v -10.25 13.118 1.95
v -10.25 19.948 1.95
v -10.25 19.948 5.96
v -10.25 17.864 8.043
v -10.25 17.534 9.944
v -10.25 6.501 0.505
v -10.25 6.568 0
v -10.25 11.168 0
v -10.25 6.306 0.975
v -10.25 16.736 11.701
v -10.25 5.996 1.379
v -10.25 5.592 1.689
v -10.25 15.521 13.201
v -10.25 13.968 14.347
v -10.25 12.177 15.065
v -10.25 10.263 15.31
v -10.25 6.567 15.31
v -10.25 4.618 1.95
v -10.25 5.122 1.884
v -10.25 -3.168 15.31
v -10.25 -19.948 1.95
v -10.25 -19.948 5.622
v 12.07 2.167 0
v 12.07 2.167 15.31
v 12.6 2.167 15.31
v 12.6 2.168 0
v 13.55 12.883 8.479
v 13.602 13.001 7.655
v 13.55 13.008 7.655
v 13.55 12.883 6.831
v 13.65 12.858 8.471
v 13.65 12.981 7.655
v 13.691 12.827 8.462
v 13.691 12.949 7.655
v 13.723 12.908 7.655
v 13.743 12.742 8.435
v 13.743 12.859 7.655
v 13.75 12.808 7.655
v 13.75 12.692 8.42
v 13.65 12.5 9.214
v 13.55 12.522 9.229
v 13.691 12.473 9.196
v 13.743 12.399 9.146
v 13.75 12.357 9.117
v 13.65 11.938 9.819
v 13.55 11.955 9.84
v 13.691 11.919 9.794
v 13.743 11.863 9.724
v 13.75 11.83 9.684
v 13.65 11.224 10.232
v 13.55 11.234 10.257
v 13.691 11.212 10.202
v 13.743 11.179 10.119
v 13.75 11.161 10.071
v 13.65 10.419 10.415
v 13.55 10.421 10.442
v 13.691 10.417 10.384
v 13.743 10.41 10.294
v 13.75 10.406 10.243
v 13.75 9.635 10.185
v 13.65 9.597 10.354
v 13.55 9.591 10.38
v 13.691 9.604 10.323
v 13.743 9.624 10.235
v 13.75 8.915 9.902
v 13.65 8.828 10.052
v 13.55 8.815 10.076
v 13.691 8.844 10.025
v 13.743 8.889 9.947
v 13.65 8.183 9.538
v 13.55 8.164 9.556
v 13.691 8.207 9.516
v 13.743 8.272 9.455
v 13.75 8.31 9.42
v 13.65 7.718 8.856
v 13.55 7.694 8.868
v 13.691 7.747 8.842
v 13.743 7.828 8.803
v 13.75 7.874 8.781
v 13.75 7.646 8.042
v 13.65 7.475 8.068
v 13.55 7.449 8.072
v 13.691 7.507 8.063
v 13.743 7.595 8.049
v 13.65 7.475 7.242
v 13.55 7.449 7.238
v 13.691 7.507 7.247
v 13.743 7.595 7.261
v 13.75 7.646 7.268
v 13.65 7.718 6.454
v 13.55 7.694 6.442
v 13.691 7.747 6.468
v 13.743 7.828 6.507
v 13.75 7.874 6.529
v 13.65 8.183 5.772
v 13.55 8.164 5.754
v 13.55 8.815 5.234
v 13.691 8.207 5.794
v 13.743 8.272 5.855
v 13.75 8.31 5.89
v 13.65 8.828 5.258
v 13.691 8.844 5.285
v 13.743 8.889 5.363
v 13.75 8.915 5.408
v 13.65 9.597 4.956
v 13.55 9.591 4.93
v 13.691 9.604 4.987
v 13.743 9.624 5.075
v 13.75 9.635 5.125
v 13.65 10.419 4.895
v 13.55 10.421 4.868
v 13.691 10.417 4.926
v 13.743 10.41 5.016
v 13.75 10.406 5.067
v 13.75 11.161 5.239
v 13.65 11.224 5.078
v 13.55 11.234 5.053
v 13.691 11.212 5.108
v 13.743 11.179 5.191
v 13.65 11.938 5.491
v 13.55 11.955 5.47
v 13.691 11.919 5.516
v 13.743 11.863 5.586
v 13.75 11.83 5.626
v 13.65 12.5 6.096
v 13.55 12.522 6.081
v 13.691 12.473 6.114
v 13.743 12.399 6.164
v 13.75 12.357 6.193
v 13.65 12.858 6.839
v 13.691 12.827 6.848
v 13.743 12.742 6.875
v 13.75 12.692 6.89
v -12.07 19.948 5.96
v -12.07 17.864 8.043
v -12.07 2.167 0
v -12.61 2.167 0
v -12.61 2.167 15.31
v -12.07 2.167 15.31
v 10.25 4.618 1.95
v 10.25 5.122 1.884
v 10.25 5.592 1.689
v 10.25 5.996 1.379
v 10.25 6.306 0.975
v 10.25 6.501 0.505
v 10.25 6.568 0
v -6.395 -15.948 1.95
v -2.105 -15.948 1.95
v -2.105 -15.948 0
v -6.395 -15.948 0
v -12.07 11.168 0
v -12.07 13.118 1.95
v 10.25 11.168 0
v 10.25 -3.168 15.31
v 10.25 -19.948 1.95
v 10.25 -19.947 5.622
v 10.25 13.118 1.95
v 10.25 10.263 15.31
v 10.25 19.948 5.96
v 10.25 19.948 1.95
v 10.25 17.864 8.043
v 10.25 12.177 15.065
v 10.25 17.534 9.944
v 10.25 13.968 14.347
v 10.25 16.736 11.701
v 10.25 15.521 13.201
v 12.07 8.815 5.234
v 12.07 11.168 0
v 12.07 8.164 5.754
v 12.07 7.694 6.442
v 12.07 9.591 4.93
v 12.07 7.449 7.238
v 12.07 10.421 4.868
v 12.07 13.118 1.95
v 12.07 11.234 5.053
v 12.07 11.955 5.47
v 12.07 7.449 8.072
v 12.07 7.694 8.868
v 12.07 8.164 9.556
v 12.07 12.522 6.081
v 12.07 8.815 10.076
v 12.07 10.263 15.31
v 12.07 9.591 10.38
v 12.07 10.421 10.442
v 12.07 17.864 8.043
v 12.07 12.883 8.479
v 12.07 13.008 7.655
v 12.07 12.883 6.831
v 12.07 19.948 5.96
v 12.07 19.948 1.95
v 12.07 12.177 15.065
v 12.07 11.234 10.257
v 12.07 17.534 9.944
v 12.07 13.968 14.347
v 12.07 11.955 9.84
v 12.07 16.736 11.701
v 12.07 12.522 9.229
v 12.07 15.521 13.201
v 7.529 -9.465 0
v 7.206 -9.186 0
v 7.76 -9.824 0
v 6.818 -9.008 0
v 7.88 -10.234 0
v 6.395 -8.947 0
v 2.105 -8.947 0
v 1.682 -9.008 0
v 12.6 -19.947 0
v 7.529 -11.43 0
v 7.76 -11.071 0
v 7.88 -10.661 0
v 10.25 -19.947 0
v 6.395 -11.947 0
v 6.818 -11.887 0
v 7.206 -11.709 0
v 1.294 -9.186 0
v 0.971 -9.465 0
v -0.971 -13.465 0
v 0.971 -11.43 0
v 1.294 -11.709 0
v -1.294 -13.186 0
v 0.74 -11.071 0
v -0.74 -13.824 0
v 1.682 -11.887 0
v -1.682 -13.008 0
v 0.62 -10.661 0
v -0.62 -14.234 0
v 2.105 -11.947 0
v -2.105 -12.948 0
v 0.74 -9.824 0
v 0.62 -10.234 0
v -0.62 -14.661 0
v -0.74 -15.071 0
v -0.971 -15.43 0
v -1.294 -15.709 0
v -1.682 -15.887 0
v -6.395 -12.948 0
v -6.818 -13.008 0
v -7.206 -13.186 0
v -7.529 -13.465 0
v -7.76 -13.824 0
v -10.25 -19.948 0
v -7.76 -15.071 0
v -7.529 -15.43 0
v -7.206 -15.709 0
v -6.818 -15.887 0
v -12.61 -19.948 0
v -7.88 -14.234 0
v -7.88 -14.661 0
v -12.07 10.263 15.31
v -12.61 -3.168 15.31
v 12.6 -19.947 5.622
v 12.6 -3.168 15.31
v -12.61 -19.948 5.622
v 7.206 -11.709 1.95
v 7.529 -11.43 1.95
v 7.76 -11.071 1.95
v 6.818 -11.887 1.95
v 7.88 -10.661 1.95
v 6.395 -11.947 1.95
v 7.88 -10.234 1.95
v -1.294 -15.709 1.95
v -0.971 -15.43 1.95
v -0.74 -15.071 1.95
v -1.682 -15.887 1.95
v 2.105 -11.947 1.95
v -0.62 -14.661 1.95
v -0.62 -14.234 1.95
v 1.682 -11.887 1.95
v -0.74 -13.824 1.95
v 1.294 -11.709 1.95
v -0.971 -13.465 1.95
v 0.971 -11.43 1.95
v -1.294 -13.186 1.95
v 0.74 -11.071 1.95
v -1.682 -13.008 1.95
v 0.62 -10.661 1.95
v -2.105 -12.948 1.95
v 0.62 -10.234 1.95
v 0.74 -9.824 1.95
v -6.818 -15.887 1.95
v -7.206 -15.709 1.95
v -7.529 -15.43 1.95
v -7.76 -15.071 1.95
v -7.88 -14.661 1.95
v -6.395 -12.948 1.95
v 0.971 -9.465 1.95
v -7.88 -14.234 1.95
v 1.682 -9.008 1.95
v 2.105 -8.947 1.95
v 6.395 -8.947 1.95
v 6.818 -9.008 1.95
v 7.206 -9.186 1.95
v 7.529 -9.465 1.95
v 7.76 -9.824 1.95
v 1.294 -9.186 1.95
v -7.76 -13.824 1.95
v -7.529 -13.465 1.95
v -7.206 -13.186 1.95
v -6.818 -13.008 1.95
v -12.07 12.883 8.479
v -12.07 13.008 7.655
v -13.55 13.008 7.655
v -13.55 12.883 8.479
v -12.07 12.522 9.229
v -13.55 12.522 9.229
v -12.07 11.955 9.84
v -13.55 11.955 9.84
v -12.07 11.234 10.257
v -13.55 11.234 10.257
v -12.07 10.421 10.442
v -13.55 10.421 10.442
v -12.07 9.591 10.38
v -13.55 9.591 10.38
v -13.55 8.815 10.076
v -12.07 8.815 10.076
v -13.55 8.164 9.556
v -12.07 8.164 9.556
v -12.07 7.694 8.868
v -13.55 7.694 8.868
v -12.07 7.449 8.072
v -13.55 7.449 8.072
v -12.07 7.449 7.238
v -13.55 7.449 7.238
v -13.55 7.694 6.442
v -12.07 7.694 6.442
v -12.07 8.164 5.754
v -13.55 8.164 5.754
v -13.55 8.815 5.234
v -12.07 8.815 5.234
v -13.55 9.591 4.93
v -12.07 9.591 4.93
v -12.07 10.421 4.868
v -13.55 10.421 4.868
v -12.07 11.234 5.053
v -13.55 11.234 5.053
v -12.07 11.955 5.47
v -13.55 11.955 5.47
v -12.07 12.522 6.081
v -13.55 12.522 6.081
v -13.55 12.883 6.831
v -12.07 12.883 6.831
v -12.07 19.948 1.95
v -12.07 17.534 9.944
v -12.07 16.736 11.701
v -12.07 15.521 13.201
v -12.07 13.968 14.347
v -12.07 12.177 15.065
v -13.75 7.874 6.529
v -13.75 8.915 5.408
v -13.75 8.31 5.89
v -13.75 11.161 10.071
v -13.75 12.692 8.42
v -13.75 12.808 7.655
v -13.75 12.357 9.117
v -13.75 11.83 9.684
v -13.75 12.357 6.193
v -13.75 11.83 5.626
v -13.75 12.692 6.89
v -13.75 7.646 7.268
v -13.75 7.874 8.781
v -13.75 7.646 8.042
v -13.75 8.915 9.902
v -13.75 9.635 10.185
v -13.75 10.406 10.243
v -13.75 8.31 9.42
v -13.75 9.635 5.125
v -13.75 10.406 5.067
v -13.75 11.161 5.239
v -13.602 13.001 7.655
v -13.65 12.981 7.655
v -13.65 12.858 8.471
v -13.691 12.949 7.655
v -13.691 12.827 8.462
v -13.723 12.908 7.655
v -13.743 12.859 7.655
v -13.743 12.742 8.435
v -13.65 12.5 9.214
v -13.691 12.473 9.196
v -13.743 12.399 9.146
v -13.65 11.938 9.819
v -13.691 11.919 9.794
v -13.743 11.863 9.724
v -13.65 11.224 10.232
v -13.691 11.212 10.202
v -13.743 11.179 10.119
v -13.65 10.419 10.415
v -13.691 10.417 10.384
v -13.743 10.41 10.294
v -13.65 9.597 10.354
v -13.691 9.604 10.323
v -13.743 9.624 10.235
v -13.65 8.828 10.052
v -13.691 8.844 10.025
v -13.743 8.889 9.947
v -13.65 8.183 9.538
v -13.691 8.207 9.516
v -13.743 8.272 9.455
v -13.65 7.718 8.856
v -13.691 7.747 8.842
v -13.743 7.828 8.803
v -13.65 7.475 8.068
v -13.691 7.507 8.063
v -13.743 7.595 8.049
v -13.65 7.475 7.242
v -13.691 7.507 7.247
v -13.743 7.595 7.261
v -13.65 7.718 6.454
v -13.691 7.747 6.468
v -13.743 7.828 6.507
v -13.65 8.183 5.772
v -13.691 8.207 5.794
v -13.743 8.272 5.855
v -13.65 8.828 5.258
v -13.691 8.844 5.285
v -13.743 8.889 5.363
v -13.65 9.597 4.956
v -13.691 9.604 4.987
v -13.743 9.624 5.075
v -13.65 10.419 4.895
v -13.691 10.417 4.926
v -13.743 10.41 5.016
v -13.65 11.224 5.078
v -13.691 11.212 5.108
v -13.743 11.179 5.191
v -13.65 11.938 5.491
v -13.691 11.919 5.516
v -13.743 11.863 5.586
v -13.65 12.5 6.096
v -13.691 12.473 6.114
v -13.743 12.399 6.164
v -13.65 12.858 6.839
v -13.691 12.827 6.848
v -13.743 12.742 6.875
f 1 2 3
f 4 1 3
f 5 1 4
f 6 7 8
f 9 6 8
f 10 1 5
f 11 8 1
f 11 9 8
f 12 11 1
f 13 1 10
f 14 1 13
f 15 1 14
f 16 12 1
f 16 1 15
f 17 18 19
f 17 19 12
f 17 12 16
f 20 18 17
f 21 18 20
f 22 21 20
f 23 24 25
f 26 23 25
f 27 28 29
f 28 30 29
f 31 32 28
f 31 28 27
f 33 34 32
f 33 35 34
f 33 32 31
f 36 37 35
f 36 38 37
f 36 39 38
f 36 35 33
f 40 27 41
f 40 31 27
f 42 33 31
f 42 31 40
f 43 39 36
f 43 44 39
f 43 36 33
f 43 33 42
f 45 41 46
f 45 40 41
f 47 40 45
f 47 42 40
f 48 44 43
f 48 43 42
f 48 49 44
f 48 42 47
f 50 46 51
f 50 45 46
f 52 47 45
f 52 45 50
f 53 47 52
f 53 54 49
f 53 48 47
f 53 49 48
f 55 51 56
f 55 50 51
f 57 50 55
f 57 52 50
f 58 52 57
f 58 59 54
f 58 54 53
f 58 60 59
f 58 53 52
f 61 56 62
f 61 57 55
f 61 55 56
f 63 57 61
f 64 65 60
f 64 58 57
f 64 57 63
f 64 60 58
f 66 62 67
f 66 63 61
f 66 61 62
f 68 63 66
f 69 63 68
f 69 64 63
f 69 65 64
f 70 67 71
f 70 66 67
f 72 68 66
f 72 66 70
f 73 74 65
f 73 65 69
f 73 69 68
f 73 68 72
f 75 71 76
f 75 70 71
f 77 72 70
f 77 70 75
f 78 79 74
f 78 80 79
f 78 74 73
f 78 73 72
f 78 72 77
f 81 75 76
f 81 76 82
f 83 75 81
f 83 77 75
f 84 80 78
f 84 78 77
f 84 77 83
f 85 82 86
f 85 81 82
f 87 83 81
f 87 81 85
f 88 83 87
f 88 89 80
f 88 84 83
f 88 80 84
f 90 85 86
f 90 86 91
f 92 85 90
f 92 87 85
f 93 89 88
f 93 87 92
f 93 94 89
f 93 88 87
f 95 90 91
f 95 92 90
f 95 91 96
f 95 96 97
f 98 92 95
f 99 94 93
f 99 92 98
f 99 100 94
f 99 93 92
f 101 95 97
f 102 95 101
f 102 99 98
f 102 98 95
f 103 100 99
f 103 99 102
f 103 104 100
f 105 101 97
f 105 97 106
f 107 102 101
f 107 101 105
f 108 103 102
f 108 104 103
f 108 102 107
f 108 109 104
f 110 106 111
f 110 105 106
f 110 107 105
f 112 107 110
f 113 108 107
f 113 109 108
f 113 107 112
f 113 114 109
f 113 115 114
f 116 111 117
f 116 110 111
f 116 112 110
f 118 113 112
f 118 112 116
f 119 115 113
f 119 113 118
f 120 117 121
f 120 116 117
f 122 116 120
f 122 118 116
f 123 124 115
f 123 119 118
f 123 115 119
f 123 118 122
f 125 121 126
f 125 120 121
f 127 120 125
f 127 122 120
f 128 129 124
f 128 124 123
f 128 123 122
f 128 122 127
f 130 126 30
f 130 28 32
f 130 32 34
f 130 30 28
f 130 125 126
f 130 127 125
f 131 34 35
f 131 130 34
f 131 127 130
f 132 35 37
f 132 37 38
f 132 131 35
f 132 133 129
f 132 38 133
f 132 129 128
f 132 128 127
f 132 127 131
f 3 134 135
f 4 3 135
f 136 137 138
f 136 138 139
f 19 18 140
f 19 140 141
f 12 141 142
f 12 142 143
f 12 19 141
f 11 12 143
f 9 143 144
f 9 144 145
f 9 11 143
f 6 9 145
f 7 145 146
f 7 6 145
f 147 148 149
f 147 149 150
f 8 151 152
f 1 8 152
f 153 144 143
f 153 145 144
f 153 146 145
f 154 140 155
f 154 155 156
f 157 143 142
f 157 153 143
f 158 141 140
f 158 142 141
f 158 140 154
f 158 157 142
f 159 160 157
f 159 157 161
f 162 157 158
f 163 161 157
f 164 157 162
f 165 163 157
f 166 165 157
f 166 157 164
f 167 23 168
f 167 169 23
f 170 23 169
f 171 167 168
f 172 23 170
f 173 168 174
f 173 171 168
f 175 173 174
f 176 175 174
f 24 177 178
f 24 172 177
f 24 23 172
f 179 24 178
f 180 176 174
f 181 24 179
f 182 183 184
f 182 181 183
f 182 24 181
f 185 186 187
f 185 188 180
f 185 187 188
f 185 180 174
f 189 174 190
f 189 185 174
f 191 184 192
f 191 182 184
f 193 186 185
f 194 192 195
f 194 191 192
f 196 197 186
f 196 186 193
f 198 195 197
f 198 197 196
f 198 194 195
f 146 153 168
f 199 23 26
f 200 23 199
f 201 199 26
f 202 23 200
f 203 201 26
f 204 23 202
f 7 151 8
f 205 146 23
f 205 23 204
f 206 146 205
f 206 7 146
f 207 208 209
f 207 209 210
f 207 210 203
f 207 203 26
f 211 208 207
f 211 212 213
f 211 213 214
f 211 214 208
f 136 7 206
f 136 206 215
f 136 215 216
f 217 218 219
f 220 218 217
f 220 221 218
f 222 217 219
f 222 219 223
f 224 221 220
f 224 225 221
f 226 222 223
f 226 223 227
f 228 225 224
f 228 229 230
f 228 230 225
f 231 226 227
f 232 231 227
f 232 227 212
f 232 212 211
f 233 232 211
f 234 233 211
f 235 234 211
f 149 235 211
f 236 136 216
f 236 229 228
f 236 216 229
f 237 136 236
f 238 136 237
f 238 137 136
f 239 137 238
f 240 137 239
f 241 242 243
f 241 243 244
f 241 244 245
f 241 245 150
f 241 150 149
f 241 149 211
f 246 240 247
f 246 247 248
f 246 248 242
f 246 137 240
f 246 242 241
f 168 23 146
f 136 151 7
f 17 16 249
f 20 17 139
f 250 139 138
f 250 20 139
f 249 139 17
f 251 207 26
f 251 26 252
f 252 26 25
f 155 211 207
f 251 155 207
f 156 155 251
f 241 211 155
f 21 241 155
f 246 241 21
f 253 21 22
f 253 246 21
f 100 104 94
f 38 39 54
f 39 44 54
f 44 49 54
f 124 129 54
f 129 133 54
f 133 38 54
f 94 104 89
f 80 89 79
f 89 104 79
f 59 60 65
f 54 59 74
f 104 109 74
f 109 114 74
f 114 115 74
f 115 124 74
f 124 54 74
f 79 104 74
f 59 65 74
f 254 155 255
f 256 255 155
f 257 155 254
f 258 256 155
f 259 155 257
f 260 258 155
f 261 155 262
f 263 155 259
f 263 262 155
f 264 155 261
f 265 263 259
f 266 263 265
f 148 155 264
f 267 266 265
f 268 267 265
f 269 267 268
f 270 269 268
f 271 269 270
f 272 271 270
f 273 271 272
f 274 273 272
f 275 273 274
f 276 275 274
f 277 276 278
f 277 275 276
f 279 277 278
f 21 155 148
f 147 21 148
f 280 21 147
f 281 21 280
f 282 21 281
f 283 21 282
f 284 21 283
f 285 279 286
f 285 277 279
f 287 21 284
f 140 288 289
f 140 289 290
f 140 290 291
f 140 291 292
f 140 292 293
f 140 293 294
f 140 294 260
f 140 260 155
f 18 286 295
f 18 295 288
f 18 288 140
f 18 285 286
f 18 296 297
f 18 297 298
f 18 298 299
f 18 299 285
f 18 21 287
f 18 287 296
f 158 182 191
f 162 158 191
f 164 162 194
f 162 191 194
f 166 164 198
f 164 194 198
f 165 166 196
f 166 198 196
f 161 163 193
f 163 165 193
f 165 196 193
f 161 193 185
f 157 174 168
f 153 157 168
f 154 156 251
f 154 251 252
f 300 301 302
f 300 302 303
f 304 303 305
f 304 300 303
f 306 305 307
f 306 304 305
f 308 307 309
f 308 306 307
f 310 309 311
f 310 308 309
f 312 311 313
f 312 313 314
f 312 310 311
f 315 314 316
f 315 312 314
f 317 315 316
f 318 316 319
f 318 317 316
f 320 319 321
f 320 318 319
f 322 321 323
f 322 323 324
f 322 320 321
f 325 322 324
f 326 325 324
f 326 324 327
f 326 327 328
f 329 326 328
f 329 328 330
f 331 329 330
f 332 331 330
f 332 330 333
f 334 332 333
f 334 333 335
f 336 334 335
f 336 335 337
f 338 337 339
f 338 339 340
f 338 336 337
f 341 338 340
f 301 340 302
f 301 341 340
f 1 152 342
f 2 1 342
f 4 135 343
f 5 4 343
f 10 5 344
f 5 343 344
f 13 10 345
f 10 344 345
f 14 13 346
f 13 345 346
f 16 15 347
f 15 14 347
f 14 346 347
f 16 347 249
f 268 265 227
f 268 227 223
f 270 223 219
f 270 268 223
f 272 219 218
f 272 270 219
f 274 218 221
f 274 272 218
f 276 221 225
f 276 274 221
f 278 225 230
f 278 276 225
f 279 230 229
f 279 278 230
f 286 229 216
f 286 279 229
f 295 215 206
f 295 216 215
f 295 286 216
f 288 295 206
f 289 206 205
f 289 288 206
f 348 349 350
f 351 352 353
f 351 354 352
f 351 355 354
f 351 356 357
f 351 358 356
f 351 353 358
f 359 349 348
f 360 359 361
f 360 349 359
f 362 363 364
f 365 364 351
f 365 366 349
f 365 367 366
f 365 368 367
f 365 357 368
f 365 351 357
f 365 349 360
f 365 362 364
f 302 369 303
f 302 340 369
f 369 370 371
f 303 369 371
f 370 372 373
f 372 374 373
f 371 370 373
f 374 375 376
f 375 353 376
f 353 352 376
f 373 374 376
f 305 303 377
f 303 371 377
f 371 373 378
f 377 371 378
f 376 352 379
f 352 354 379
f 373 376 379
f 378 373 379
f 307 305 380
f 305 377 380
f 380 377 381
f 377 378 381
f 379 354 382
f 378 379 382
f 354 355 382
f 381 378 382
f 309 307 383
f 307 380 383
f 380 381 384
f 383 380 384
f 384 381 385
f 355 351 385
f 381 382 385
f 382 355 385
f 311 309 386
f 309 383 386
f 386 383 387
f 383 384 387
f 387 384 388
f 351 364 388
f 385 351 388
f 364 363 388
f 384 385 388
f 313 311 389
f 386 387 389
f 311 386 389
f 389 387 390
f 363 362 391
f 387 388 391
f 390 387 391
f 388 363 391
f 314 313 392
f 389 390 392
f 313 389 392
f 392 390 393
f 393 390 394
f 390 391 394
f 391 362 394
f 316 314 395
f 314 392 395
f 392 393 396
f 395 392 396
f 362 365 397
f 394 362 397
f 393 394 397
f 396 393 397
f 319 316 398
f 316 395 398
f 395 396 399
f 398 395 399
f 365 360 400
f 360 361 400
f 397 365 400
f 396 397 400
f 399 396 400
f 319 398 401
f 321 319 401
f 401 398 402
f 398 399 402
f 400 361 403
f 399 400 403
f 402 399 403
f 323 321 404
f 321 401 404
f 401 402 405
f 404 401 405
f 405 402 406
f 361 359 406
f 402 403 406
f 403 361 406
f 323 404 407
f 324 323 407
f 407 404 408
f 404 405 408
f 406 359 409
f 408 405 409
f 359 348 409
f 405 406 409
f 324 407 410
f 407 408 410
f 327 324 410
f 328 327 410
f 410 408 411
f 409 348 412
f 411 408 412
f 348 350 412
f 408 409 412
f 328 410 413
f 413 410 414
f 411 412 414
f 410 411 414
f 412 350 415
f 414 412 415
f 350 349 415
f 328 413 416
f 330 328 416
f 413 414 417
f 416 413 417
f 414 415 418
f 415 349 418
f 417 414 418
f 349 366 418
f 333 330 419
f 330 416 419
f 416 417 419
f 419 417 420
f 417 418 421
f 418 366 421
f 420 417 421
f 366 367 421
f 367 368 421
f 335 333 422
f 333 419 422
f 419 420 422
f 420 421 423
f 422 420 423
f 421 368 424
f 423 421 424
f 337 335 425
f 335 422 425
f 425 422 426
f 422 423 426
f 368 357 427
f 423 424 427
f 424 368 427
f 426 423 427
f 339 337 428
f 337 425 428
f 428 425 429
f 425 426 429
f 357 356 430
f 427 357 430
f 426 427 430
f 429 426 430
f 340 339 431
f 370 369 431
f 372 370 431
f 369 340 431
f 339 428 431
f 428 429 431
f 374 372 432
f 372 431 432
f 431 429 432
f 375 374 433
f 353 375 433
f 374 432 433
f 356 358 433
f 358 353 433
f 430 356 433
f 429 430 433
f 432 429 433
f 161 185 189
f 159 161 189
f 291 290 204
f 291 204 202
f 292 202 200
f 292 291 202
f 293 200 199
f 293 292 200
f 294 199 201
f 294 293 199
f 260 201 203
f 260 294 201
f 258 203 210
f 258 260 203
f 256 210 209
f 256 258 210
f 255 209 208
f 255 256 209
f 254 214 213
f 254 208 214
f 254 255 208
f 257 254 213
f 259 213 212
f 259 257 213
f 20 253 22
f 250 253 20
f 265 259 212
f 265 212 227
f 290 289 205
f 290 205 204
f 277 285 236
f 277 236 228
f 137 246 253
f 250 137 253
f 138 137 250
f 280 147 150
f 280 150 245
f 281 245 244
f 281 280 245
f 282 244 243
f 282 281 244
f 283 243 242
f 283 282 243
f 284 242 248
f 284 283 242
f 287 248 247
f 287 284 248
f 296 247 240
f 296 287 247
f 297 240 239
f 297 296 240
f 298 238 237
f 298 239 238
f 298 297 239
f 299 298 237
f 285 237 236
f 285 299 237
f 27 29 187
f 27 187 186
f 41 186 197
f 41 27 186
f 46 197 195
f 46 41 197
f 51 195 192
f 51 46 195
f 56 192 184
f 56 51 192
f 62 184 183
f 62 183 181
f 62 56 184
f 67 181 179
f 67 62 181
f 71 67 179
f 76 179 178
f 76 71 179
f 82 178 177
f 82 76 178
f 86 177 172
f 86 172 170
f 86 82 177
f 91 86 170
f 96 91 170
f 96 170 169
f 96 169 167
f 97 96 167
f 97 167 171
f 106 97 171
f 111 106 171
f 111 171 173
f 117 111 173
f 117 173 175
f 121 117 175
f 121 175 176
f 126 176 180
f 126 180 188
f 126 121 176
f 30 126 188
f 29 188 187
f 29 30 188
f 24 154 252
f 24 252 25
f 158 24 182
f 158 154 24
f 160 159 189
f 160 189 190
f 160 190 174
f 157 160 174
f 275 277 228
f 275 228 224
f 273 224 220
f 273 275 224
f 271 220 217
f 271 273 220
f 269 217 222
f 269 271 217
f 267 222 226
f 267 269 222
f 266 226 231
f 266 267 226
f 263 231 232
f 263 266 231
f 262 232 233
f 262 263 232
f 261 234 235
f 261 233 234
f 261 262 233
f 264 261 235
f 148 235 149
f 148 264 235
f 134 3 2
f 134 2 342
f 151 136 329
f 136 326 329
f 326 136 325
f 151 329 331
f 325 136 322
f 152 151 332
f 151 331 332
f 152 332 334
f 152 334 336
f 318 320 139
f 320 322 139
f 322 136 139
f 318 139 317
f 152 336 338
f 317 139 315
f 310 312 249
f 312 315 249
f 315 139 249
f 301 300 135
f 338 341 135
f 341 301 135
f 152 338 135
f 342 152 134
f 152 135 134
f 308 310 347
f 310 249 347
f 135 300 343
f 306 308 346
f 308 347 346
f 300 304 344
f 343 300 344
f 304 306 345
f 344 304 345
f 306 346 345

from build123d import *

# Parameters (mm, degrees)
BOSS_EXTRUDE1_DEPTH = 3.67
SKETCH2_W           = 3.67
SKETCH2_H           = 9.687937517
BOSS_EXTRUDE2_DEPTH = 9.735
SKETCH3_W           = 3.67
SKETCH3_H           = 26.515
BOSS_EXTRUDE3_DEPTH = 5.622062483
BOSS_EXTRUDE4_DEPTH = 20.5
SKETCH5_W           = 3.67
SKETCH5_H           = 15.31
BOSS_EXTRUDE5_DEPTH = 13.38
BOSS_EXTRUDE6_DEPTH = 2.35
SKETCH7_W           = 1.85
SKETCH7_H           = 17.78
CUT_EXTRUDE1_DEPTH  = 16.310000003
CUT_EXTRUDE2_REACH  = 27.99
SKETCH9_W           = 1.85
SKETCH9_H           = 17.78
CUT_EXTRUDE3_DEPTH  = 16.310000003
CUT_EXTRUDE4_REACH  = 26.67
CUT_EXTRUDE5_REACH  = 26.67
CUT_EXTRUDE6_DEPTH  = 26.99
CUT_EXTRUDE7_DEPTH  = 2.95
SKETCH15_W          = 1.68
SKETCH15_H          = 2.795
SKETCH16_W          = 1.68
SKETCH16_H          = 2.795
FILLET1_R           = 0.2
CUT_EXTRUDE8_DEPTH  = 1.31


with BuildPart() as part:
    # Sketch1 → Boss-Extrude1 (new body)
    with BuildSketch(Plane(origin=(-13.92, 0, 0), x_dir=(0, -1, 0), z_dir=(-1, 0, 0))):
        Polygon((19.9475, 5.622062483), (3.1675, 15.31), (3.1675, 5.622062483), align=None)
    extrude(amount=-BOSS_EXTRUDE1_DEPTH)

    # Sketch2 → Boss-Extrude2 (add)
    with BuildSketch(Plane(origin=(0, -3.1675, 0), x_dir=(-1, 0, 0), z_dir=(0, 1, 0))):
        with Locations((12.085, 10.466031242)):
            Rectangle(SKETCH2_W, SKETCH2_H)
    extrude(amount=BOSS_EXTRUDE2_DEPTH)

    # Sketch3 → Boss-Extrude3 (add)
    with BuildSketch(Plane(origin=(0, 0, 5.622062483), x_dir=(-1, 0, 0), z_dir=(0, 0, -1))):
        with Locations((12.085, -6.69)):
            Rectangle(SKETCH3_W, SKETCH3_H)
    extrude(amount=BOSS_EXTRUDE3_DEPTH)

    # Sketch4 → Boss-Extrude4 (add)
    with BuildSketch(Plane(origin=(-10.25, 0, 0), x_dir=(0, 0, -1), z_dir=(1, 0, 0))):
        with BuildLine():
            Line((3e-09, -19.9475), (-1.949999997, -19.9475))
            Line((-1.949999997, -19.9475), (-1.949999997, 4.6175))
            ThreePointArc((-1.949999997, 4.6175), (-1.37885822, 5.996358223), (3e-09, 6.5675))
            Line((3e-09, 6.5675), (3e-09, -19.9475))
        make_face()
    extrude(amount=BOSS_EXTRUDE4_DEPTH)

    # Sketch5 → Boss-Extrude5 (add)
    with BuildSketch(Plane(origin=(0, 6.5675, 0), x_dir=(-1, 0, 0), z_dir=(0, 1, 0))):
        with Locations((12.085, 7.655)):
            Rectangle(SKETCH5_W, SKETCH5_H)
    extrude(amount=BOSS_EXTRUDE5_DEPTH)

    # Sketch6 → Boss-Extrude6 (add)
    with BuildSketch(Plane(origin=(10.25, 0, 0), x_dir=(0, 0, -1), z_dir=(1, 0, 0))):
        Polygon((-15.31, -3.1675), (-15.31, 19.9475), (2e-09, 19.9475), (2e-09, -19.947499999), (-5.622062484, -19.947499999), align=None)
    extrude(amount=BOSS_EXTRUDE6_DEPTH)

    # Sketch7 → Cut-Extrude1 (cut, through all)
    with BuildSketch(Plane.XY.offset(15.31)):
        with Locations((12.995, 11.0575)):
            Rectangle(SKETCH7_W, SKETCH7_H)
    extrude(amount=-CUT_EXTRUDE1_DEPTH, mode=Mode.SUBTRACT)

    # Sketch8 → Cut-Extrude2 (cut, up to next)
    with BuildSketch(Plane(origin=(12.07, 0, 0), x_dir=(0, 0, -1), z_dir=(1, 0, 0)), mode=Mode.PRIVATE) as cut_extrude2_sk1:
        with BuildLine():
            Line((-8.04306505, 17.864239052), (-5.959804102, 19.9475))
            Line((-5.959804102, 19.9475), (-15.31, 19.9475))
            Line((-15.31, 19.9475), (-15.31, 10.26298277))
            ThreePointArc((-15.31, 10.26298277), (-13.200981436, 15.521010933), (-8.04306505, 17.864239052))
        make_face()
    cut_extrude2_tool1 = extrude(cut_extrude2_sk1.sketch, amount=-CUT_EXTRUDE2_REACH, mode=Mode.PRIVATE) & part.part
    add(cut_extrude2_tool1.solids().sort_by_distance((12.07, 17.788809, 12.169828))[0], mode=Mode.SUBTRACT)

    # Sketch9 → Cut-Extrude3 (cut, through all)
    with BuildSketch(Plane.XY.offset(15.31)):
        with Locations((-12.995, 11.0575)):
            Rectangle(SKETCH9_W, SKETCH9_H)
    extrude(amount=-CUT_EXTRUDE3_DEPTH, mode=Mode.SUBTRACT)

    # Sketch10 → Cut-Extrude4 (cut, up to next)
    with BuildSketch(Plane.ZY.offset(12.07), mode=Mode.PRIVATE) as cut_extrude4_sk1:
        Polygon((1.95, 13.1175), (1.95, 19.9475), (0, 19.9475), (0, 11.1675), align=None)
    cut_extrude4_tool1 = extrude(cut_extrude4_sk1.sketch, amount=-CUT_EXTRUDE4_REACH, mode=Mode.PRIVATE) & part.part
    add(cut_extrude4_tool1.solids().sort_by_distance((-12.07, 16.024701, 0.934401))[0], mode=Mode.SUBTRACT)

    # Sketch11 → Cut-Extrude5 (cut, up to next)
    with BuildSketch(Plane.ZY.offset(12.07), mode=Mode.PRIVATE) as cut_extrude5_sk1:
        with BuildLine():
            Line((5.959804102, 19.9475), (8.04306505, 17.864239052))
            ThreePointArc((8.04306505, 17.864239052), (13.200981436, 15.521010933), (15.31, 10.26298277))
            Line((15.31, 10.26298277), (15.31, 19.9475))
            Line((15.31, 19.9475), (5.959804102, 19.9475))
        make_face()
    cut_extrude5_tool1 = extrude(cut_extrude5_sk1.sketch, amount=-CUT_EXTRUDE5_REACH, mode=Mode.PRIVATE) & part.part
    add(cut_extrude5_tool1.solids().sort_by_distance((-12.07, 17.788809, 12.169828))[0], mode=Mode.SUBTRACT)

    # Sketch12 → Cut-Extrude6 (cut, through all)
    with BuildSketch(Plane(origin=(12.07, 0, 0), x_dir=(0, 0, -1), z_dir=(1, 0, 0))):
        Polygon((-1.95, 19.9475), (-1.95, 13.1175), (0, 11.1675), (0, 19.9475), align=None)
    extrude(amount=-CUT_EXTRUDE6_DEPTH, mode=Mode.SUBTRACT)

    # Sketch13 → Cut-Extrude7 (cut, through all)
    with BuildSketch(Plane.XY.offset(1.949999997)):
        with BuildLine():
            Line((-6.395488685, -12.9475), (-2.104511315, -12.9475))
            ThreePointArc((-2.104511315, -12.9475), (-0.604511315, -14.4475), (-2.104511315, -15.9475))
            Line((-2.104511315, -15.9475), (-6.395488685, -15.9475))
            ThreePointArc((-6.395488685, -15.9475), (-7.895488685, -14.4475), (-6.395488685, -12.9475))
        make_face()
        with BuildLine():
            Line((2.104511315, -8.947499999), (6.395488685, -8.947499999))
            ThreePointArc((6.395488685, -8.947499999), (7.895488685, -10.447499999), (6.395488685, -11.947499999))
            Line((6.395488685, -11.947499999), (2.104511315, -11.947499999))
            ThreePointArc((2.104511315, -11.947499999), (0.604511315, -10.447499999), (2.104511315, -8.947499999))
        make_face()
    extrude(amount=-CUT_EXTRUDE7_DEPTH, mode=Mode.SUBTRACT)

    # Sketch15 → Revolve1 (revolve)
    with BuildSketch(Plane.XY.offset(7.655)):
        with Locations((12.91, 11.61)):
            Rectangle(SKETCH15_W, SKETCH15_H)
    revolve(axis=Axis((12.07, 10.2125, 7.655), (1, 0, 0)))

    # Sketch16 → Revolve2 (revolve)
    with BuildSketch(Plane.XY.offset(7.655)):
        with Locations((-12.91, 11.61)):
            Rectangle(SKETCH16_W, SKETCH16_H)
    revolve(axis=Axis((-13.75, 10.2125, 7.655), (1, 0, 0)))

    # Fillet1
    fillet1_edges = [part.edges().sort_by_distance(p)[0] for p in [
        (13.75, 7.4175, 7.655),
        (-13.75, 7.4175, 7.655),
    ]]
    fillet(fillet1_edges, radius=FILLET1_R)

    # Sketch17 → Cut-Extrude8 (cut)
    with BuildSketch(Plane(origin=(-13.92, -19.9475, 5.622062483), x_dir=(0, 0, 1), z_dir=(-1, 0, 0))):
        Polygon((9.687937517, 22.115), (-5.622062486, 22.115), (-5.622062483, 0), (0, 0), (9.687937517, 16.78), align=None)
    extrude(amount=-CUT_EXTRUDE8_DEPTH, mode=Mode.SUBTRACT)


solid = part.part
